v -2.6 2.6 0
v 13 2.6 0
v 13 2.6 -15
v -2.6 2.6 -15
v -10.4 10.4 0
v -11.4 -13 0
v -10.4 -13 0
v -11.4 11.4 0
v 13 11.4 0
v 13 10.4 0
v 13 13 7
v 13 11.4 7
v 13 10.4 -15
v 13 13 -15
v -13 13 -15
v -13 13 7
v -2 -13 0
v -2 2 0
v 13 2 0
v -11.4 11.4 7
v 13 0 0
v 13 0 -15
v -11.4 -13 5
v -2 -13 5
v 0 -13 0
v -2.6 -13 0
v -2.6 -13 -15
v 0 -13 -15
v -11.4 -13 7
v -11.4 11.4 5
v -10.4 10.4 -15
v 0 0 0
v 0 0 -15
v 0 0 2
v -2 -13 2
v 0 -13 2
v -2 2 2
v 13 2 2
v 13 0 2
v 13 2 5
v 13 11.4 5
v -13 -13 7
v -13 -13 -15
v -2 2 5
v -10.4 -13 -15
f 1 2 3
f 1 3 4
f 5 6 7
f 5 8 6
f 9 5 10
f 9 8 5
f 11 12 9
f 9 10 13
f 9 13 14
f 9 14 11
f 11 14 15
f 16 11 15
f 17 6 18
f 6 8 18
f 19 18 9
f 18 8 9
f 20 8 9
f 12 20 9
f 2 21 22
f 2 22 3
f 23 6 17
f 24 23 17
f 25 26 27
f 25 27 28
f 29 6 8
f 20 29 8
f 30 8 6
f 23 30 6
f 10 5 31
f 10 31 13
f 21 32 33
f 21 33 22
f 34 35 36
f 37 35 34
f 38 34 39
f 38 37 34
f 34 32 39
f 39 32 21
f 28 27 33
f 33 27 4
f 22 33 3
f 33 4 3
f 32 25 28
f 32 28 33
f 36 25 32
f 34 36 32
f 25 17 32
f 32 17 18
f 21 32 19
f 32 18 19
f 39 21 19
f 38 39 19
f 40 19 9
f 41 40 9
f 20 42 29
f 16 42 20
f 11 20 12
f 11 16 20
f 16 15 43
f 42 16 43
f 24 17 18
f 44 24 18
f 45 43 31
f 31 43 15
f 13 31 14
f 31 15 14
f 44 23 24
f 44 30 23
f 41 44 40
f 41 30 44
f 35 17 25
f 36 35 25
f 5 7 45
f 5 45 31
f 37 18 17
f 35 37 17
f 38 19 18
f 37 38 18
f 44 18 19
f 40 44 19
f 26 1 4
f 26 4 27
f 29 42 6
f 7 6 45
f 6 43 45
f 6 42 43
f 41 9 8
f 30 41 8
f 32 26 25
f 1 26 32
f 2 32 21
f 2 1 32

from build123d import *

# Parameters (mm, degrees)
F1_DEPTH = 15
F2_DEPTH = 7
F3_DEPTH = 5
F4_DEPTH = 2


with BuildPart() as f1:
    # F0 (on Top) → F1 (new body)
    with BuildSketch(Plane.XY):
        Polygon((-11.4, -13), (-10.4, -13), (-10.4, 0), (-10.4, 10.4), (0, 10.4), (13, 10.4), (13, 11.4), (0, 11.4), (-11.4, 11.4), (-11.4, 0), align=None)
        Polygon((-13, -13), (-11.4, -13), (-11.4, 0), (-11.4, 11.4), (0, 11.4), (13, 11.4), (13, 13), (0, 13), (-13, 13), (-13, 0), align=None)
        Polygon((-2.6, -13), (-2, -13), (-2, 2), (13, 2), (13, 2.6), (-2.6, 2.6), align=None)
        Polygon((-2, -13), (0, -13), (0, 0), (13, 0), (13, 2), (-2, 2), align=None)
    extrude(amount=-F1_DEPTH)

    # F0 (on Top) → F2 (join)
    with BuildSketch(Plane.XY):
        Polygon((-13, -13), (-11.4, -13), (-11.4, 0), (-11.4, 11.4), (0, 11.4), (13, 11.4), (13, 13), (0, 13), (-13, 13), (-13, 0), align=None)
    extrude(amount=F2_DEPTH)


with BuildPart() as f3:
    # F0 (on Top) → F3 (new body)
    with BuildSketch(Plane.XY):
        Polygon((-11.4, -13), (-10.4, -13), (-10.4, 0), (-10.4, 10.4), (0, 10.4), (13, 10.4), (13, 11.4), (0, 11.4), (-11.4, 11.4), (-11.4, 0), align=None)
        Polygon((-10.4, -13), (-2.6, -13), (-2.6, 2.6), (13, 2.6), (13, 10.4), (0, 10.4), (-10.4, 10.4), (-10.4, 0), align=None)
        Polygon((-2.6, -13), (-2, -13), (-2, 2), (13, 2), (13, 2.6), (-2.6, 2.6), align=None)
    extrude(amount=F3_DEPTH)


with BuildPart() as f4:
    # F0 (on Top) → F4 (new body)
    with BuildSketch(Plane.XY):
        Polygon((-2, -13), (0, -13), (0, 0), (13, 0), (13, 2), (-2, 2), align=None)
    extrude(amount=F4_DEPTH)


solid = Compound([f1.part, f3.part, f4.part])
